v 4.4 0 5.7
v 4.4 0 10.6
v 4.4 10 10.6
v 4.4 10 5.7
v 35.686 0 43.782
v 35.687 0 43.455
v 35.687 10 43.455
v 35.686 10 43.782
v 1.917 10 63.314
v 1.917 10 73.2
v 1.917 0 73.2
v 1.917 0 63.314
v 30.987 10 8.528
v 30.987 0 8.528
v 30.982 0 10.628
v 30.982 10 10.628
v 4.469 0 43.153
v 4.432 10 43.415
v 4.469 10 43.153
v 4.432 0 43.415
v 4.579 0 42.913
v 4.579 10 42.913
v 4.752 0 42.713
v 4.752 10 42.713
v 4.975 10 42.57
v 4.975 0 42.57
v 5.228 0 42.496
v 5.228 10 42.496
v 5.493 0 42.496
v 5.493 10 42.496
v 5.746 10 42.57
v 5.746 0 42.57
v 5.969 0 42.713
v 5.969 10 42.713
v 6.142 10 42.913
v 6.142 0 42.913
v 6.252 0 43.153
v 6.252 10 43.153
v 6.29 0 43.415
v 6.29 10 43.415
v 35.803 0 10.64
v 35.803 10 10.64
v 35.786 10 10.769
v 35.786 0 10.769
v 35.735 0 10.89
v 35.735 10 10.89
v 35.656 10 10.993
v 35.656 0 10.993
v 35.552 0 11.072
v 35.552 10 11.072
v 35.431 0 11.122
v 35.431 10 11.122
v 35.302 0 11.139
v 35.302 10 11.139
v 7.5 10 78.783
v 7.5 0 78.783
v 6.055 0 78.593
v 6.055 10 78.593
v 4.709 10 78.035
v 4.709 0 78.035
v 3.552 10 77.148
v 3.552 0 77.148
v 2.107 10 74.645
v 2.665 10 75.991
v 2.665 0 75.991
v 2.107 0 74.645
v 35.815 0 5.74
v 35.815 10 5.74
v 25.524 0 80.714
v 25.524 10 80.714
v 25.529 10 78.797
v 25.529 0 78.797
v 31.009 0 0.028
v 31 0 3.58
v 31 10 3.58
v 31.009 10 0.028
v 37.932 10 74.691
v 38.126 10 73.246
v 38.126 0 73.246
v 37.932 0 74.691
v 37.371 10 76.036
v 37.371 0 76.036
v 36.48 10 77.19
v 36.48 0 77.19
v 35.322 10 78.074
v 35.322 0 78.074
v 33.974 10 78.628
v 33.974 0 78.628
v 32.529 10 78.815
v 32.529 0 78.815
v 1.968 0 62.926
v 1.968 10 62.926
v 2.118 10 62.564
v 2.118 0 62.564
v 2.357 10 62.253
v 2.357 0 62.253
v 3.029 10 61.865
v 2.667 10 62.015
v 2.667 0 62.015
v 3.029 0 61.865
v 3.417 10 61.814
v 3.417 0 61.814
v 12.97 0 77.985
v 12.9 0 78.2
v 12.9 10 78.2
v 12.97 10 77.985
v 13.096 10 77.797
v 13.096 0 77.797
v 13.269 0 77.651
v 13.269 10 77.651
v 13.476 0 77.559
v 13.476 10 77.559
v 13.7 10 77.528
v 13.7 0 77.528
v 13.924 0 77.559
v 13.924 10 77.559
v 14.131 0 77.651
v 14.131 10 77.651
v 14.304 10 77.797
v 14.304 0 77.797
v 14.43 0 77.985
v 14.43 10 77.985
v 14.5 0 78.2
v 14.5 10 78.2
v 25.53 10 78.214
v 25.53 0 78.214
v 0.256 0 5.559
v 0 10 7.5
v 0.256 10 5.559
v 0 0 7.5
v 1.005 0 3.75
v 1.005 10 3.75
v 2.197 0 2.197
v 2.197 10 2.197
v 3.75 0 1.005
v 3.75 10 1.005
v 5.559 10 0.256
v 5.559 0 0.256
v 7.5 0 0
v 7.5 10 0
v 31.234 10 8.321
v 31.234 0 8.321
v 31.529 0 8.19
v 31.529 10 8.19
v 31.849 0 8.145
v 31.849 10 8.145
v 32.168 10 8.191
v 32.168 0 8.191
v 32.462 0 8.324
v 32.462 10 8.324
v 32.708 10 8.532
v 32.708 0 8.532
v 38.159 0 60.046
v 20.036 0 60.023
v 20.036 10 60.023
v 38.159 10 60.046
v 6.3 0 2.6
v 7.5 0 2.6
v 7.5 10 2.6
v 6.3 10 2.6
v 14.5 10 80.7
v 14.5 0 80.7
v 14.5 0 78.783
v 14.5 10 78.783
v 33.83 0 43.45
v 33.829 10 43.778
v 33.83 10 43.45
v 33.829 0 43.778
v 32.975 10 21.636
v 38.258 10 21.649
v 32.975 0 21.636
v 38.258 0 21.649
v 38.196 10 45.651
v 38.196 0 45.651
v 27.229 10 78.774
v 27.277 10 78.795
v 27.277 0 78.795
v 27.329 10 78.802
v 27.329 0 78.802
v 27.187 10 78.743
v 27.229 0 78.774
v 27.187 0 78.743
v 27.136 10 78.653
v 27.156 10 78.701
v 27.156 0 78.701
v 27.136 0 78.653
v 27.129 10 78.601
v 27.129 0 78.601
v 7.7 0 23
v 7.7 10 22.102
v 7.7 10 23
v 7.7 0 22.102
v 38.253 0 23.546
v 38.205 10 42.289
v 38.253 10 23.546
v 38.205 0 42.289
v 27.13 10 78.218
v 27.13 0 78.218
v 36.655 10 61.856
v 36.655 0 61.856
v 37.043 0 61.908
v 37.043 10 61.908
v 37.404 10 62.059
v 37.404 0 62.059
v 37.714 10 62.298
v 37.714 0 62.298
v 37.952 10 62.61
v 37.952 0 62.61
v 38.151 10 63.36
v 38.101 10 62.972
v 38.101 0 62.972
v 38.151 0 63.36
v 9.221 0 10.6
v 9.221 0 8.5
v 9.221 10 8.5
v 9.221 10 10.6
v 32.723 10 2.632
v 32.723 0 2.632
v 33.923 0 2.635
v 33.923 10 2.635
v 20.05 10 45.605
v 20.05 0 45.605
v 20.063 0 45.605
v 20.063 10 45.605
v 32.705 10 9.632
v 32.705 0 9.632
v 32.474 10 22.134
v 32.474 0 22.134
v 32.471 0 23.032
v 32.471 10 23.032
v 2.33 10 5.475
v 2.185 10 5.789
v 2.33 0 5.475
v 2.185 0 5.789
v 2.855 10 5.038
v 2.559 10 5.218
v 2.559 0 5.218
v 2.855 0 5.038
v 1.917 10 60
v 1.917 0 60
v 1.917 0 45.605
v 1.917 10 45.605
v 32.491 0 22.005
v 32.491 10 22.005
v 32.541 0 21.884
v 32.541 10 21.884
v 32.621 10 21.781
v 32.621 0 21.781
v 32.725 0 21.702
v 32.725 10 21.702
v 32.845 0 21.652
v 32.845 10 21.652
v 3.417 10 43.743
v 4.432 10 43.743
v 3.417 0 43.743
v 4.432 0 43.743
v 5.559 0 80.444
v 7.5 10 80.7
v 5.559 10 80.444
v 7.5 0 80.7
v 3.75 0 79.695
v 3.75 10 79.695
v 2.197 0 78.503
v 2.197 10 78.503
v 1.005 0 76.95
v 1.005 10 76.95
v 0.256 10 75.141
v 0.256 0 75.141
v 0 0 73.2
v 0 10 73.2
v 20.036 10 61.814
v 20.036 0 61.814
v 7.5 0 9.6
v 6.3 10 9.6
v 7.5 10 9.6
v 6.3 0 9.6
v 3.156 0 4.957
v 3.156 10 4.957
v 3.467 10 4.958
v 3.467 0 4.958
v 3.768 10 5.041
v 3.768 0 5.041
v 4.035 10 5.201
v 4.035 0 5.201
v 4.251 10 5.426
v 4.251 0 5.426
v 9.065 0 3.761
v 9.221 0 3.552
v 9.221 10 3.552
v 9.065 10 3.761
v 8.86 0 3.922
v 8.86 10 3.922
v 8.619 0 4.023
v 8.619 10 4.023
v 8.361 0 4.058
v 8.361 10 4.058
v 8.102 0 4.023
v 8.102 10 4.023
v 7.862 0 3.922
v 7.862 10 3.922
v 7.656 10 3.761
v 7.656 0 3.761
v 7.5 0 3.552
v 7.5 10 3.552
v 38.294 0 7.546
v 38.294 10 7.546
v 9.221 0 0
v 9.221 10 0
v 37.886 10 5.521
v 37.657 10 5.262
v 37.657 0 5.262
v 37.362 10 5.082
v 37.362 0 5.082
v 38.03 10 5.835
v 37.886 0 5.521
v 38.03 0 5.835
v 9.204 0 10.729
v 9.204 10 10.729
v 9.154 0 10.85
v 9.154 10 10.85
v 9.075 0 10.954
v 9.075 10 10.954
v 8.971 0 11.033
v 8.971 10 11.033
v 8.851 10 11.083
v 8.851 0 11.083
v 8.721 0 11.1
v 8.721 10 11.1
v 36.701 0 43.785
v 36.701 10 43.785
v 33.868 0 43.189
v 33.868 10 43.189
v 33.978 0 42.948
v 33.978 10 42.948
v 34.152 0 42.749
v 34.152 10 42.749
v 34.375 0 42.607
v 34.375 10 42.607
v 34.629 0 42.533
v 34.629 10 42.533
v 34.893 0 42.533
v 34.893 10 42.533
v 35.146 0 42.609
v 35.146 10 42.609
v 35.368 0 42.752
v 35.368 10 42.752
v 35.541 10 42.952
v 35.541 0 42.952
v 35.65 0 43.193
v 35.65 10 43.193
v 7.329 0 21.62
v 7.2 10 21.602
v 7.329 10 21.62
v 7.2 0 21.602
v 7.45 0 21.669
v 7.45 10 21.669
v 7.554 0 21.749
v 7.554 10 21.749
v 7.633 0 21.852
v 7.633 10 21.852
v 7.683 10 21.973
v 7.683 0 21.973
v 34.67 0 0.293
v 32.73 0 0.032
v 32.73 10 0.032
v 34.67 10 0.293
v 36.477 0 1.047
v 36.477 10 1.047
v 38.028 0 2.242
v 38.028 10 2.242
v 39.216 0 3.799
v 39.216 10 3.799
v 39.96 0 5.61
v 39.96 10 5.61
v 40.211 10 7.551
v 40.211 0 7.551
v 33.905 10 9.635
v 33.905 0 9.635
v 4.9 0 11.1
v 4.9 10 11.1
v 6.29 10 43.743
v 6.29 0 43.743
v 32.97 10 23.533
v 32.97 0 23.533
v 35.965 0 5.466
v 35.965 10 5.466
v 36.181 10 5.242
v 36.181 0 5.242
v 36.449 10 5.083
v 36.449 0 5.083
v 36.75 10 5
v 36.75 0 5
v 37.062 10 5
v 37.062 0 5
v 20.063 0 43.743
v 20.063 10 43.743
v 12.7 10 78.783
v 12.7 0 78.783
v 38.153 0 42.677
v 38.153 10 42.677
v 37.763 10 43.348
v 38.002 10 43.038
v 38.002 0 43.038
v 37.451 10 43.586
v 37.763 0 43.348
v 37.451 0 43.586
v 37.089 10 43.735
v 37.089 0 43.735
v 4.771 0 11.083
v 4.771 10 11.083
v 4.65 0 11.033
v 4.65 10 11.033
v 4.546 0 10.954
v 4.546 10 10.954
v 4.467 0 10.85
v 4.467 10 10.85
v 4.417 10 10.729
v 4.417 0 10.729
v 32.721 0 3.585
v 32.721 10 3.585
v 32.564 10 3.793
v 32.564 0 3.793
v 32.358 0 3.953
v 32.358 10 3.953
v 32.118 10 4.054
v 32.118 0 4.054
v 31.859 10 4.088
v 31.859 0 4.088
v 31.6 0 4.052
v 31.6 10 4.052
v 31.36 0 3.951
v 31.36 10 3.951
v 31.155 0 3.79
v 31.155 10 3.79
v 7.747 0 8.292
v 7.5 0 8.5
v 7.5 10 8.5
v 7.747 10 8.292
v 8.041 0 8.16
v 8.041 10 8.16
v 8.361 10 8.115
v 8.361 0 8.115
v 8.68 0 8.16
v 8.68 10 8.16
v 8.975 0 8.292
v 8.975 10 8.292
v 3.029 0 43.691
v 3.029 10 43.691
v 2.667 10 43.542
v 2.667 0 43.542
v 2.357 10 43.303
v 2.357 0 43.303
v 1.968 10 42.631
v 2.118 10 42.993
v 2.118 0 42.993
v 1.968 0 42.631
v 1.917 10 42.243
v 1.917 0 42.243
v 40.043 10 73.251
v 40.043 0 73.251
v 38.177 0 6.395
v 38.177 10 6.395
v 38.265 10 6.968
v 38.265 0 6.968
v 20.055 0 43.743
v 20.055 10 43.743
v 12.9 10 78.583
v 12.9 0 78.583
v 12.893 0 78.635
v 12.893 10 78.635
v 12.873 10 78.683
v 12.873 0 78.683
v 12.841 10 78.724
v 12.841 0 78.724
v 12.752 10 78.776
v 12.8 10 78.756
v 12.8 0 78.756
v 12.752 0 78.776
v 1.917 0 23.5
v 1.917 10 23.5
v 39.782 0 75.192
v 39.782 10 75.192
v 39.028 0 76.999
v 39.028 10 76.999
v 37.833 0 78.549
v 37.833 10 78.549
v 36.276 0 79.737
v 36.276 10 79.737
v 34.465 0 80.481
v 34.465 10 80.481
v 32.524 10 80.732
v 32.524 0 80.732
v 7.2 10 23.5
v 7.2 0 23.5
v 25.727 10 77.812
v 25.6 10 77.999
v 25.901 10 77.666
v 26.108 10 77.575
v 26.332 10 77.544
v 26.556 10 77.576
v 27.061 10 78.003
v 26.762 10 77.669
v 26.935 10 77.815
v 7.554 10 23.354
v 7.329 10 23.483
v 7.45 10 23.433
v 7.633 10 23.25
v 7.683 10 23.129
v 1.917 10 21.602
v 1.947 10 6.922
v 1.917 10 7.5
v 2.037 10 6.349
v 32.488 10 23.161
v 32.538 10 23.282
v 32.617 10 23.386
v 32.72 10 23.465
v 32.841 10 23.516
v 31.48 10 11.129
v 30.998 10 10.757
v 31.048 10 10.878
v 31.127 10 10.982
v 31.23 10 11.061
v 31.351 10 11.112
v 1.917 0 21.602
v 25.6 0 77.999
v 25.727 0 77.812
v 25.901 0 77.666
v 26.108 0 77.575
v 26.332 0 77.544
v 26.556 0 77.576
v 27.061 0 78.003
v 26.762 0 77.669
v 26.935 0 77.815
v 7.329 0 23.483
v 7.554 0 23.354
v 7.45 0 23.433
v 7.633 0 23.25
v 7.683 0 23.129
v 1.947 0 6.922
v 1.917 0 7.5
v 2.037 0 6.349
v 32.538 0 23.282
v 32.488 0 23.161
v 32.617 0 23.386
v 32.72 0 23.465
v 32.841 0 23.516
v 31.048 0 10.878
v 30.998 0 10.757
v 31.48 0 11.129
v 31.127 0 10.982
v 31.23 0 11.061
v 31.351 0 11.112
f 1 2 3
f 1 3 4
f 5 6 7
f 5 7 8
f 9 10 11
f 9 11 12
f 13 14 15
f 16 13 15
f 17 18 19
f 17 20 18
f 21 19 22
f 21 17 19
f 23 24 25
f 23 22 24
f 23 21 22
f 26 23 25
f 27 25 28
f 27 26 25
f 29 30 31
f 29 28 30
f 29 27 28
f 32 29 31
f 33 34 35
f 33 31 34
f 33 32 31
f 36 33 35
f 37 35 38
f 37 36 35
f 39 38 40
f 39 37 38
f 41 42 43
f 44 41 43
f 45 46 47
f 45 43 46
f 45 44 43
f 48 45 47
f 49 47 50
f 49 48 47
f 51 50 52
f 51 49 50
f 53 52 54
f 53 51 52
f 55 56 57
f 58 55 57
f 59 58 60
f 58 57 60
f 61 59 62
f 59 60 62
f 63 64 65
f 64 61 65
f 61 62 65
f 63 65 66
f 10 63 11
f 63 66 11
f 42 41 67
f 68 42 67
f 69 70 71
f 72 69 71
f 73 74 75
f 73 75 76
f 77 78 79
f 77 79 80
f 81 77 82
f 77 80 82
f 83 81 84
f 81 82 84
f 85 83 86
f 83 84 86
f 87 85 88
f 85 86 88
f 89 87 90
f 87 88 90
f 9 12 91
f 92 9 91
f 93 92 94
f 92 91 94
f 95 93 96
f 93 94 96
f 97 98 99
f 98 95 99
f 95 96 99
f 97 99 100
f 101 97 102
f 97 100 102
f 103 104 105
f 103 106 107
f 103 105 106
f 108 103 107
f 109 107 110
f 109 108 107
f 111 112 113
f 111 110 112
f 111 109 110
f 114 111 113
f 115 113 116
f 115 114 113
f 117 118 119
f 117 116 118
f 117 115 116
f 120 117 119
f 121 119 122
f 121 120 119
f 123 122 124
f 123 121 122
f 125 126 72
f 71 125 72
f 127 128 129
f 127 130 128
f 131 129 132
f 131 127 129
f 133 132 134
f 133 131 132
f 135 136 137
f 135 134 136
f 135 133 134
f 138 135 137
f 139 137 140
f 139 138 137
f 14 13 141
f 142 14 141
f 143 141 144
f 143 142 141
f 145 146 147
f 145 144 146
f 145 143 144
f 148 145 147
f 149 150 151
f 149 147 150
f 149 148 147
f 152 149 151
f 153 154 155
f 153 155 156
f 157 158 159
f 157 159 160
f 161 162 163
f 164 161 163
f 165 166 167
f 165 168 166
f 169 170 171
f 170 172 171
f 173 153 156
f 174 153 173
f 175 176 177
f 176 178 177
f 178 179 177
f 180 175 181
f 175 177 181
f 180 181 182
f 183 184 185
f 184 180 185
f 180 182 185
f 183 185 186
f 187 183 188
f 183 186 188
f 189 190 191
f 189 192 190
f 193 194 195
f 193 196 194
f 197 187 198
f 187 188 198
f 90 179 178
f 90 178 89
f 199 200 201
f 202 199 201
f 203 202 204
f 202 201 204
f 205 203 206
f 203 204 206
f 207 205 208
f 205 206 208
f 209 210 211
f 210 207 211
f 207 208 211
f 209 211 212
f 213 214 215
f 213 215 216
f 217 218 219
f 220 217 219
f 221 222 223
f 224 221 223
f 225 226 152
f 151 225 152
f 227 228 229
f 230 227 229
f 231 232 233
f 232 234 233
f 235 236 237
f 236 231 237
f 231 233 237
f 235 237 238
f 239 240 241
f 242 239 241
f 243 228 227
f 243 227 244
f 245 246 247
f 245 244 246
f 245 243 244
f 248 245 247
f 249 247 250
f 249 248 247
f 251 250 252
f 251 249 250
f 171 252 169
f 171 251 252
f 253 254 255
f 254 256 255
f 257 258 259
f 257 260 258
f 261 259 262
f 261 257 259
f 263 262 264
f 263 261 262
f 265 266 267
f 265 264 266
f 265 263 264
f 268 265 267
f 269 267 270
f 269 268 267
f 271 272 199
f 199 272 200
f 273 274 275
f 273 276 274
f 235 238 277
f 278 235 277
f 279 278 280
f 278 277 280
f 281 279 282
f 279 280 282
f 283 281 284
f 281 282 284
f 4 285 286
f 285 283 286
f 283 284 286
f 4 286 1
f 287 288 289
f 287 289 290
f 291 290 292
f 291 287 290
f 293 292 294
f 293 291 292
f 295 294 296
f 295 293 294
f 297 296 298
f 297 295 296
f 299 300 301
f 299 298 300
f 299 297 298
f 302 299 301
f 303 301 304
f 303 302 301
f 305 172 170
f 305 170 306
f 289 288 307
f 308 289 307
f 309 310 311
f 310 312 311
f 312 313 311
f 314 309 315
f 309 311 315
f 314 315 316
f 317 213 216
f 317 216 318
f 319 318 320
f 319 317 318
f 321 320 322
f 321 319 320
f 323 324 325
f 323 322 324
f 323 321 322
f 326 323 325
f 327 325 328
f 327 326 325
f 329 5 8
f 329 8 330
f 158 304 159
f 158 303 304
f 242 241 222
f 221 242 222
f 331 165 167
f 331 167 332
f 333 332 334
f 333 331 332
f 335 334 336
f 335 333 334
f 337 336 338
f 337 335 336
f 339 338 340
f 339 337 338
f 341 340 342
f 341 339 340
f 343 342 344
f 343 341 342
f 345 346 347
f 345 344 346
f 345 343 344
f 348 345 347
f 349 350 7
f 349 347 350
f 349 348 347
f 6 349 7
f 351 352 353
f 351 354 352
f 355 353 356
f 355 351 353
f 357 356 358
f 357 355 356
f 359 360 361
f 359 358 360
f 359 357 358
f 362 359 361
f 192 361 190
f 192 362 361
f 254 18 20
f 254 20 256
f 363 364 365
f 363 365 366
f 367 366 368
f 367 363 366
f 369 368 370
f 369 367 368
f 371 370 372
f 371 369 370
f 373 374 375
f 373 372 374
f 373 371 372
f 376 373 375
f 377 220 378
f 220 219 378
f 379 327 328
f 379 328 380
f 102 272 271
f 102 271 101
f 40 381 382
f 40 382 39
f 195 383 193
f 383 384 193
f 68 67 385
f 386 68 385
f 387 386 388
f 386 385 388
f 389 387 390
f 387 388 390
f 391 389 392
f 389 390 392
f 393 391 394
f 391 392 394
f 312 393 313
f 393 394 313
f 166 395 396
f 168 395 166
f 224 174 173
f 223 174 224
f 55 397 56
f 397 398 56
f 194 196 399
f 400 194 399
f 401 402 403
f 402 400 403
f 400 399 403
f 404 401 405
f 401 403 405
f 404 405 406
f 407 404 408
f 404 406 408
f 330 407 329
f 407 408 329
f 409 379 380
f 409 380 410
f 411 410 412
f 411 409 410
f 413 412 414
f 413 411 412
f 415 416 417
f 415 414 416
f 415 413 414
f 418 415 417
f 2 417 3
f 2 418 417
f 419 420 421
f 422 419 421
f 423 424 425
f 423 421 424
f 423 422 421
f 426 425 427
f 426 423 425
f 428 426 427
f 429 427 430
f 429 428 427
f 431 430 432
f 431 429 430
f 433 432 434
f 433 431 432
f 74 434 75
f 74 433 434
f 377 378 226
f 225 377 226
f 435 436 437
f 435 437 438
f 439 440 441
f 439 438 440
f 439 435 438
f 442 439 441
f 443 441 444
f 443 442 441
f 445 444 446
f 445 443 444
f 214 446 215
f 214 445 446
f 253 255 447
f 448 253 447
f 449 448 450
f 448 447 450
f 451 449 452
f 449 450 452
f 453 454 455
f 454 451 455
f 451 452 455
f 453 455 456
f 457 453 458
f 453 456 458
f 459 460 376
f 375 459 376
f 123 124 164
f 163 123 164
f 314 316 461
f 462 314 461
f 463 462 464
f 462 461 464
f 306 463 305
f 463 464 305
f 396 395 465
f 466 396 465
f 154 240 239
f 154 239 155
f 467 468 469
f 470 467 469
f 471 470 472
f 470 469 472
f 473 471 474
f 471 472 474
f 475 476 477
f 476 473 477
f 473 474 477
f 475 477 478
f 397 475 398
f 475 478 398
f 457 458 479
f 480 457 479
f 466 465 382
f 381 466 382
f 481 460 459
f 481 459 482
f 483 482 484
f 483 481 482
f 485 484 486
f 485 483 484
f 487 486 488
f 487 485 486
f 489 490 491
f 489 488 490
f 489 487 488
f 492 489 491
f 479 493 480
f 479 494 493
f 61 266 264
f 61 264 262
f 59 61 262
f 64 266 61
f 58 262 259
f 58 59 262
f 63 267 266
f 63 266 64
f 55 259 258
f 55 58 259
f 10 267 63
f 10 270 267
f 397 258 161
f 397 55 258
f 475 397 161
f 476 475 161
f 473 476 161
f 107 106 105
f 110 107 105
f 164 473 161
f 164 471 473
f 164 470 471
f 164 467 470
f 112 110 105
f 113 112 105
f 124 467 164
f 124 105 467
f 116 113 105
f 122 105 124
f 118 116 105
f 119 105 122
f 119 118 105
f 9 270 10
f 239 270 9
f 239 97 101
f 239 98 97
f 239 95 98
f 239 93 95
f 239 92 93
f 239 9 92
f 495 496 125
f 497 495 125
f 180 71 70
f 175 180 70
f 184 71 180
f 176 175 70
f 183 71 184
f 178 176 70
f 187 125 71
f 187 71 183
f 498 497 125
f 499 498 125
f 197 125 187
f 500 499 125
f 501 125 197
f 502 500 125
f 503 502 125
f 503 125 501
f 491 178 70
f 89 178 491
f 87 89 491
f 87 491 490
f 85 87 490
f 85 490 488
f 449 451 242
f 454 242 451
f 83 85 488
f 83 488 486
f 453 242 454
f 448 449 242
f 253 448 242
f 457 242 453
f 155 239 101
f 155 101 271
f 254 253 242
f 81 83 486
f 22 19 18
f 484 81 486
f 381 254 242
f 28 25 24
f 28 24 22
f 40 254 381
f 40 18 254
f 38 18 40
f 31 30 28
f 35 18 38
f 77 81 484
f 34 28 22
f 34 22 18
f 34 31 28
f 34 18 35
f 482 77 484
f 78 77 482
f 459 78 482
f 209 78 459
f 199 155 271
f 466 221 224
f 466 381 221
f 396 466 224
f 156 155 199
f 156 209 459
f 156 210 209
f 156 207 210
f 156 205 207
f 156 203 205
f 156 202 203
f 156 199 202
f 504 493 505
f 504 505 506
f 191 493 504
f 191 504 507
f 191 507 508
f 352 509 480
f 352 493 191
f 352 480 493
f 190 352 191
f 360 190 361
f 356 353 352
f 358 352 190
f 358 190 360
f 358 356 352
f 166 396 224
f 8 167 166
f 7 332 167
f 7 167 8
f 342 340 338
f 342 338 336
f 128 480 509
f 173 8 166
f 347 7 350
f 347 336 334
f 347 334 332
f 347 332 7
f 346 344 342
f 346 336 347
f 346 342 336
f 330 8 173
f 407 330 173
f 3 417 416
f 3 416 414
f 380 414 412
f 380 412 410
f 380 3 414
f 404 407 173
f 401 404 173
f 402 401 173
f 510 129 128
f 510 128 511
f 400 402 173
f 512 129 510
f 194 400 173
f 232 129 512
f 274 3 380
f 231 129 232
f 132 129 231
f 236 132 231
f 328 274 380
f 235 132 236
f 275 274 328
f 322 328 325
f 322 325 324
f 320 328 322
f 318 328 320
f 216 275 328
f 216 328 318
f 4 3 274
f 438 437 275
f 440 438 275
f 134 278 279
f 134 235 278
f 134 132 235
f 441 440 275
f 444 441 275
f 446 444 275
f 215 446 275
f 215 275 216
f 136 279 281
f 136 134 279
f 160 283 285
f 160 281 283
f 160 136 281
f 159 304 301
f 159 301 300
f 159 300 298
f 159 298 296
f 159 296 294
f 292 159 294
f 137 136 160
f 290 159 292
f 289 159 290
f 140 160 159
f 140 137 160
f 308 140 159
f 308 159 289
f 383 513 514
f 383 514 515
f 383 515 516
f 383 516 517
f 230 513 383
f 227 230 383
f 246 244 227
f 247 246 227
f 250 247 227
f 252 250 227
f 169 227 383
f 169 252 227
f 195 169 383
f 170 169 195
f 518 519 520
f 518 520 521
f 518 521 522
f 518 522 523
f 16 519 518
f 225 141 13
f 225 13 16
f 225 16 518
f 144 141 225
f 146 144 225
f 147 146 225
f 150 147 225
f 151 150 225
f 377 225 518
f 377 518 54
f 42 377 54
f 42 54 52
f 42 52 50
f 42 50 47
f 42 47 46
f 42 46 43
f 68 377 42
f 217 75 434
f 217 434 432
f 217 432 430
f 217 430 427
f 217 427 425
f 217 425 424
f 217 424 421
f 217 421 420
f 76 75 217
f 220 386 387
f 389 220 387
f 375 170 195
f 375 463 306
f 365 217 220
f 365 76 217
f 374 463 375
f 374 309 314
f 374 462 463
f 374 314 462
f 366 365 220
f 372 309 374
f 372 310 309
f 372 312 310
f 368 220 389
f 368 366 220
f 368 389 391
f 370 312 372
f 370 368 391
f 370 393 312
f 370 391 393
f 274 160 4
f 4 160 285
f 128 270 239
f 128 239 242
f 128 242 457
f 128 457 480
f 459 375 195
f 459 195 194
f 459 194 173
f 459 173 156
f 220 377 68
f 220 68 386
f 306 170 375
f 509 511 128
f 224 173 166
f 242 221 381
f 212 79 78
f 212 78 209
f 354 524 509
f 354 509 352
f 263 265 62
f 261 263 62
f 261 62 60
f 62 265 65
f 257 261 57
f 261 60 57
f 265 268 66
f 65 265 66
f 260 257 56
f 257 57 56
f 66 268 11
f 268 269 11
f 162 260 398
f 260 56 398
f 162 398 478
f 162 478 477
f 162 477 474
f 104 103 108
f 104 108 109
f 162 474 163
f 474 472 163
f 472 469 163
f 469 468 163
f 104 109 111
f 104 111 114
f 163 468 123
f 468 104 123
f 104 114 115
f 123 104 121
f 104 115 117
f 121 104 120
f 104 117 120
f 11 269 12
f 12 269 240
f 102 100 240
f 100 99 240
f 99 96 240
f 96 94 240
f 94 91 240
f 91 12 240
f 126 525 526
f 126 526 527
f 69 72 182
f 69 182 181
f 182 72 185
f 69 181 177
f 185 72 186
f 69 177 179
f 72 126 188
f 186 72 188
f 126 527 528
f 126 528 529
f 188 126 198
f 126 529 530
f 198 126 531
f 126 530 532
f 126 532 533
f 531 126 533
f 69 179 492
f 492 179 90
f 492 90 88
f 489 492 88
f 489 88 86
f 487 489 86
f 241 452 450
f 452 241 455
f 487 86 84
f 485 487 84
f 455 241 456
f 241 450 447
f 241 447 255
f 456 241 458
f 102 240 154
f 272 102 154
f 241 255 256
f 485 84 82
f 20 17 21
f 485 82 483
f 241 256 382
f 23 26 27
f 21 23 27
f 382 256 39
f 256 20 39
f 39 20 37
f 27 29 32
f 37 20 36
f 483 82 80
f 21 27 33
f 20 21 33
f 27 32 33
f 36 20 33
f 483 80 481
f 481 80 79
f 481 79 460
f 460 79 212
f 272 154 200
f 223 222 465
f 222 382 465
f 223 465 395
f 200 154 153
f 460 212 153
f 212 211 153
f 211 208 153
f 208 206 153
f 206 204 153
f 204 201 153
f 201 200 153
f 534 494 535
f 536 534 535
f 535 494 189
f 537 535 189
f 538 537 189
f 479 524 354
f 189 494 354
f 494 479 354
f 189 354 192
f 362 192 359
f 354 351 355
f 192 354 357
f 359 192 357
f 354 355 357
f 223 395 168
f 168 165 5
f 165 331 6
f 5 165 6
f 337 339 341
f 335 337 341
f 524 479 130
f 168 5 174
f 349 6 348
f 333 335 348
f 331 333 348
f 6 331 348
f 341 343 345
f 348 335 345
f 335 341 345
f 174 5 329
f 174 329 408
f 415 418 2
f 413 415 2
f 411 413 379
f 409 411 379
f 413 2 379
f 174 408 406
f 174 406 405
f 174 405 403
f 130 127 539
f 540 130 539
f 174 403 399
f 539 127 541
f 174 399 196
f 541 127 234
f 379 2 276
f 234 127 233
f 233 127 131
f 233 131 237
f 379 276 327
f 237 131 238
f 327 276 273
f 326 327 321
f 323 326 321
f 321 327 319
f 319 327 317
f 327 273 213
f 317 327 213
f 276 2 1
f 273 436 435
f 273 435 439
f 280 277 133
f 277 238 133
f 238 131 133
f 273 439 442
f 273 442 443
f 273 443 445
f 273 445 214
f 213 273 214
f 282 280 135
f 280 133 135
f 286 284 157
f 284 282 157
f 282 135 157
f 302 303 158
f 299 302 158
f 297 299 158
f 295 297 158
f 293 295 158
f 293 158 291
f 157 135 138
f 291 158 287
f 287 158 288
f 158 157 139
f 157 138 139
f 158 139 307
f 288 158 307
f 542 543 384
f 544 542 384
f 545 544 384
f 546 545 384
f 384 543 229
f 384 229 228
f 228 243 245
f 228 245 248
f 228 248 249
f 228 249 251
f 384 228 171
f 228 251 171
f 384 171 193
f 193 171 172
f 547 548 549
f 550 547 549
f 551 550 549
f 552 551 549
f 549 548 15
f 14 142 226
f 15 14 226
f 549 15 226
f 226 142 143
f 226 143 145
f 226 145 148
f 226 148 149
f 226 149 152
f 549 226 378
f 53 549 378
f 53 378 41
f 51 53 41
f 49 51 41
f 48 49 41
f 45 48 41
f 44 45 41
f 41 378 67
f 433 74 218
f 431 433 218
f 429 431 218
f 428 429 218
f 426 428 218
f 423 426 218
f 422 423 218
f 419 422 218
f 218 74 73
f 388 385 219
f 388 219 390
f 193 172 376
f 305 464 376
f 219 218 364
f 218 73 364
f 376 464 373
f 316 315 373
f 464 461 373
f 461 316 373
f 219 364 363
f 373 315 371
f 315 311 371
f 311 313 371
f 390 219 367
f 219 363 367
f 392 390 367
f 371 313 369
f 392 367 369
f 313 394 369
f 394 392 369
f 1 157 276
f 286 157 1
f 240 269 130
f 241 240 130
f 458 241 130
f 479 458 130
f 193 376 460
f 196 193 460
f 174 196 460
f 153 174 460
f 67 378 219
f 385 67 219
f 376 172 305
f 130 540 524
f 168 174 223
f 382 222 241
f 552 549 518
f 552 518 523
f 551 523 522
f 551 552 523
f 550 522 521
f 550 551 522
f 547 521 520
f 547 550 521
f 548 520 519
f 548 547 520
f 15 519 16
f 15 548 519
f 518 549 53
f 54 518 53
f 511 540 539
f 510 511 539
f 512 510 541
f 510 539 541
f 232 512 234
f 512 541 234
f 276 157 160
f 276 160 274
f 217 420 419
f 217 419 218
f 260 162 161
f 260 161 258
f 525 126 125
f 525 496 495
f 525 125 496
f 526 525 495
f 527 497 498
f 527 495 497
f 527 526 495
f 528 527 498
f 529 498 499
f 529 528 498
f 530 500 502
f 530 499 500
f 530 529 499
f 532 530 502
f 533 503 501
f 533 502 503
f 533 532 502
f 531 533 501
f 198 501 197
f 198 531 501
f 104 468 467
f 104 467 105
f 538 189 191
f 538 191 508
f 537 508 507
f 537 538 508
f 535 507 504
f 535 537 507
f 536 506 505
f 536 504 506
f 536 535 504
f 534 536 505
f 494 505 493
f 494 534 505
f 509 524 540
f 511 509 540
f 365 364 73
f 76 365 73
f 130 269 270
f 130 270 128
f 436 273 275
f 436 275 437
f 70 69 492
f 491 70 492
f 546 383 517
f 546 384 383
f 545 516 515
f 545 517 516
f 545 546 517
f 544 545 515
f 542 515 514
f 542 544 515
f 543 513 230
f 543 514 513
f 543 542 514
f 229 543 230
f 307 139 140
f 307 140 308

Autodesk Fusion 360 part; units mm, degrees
sketch "Boceto2" plane through (0, 0, 0) normal (0, 1, 0) x (1, 0, 0)
  line L0 (7.5, 0) -> (9.2213, 0)
  line L1 (14.5, -80.7) -> (7.5, -80.7)
  line L2 (0, -73.2) -> (0, -7.5)
  arc A0 (0, -73.2) -> (7.5, -80.7) centre (7.5, -73.2) ccw
  arc A1 (7.5, 0) -> (0, -7.5) centre (7.5, -7.5) ccw
  line L3 (12.7, -78.7828) -> (7.5, -78.7828)
  arc A2 (1.9172, -73.2) -> (7.5, -78.7828) centre (7.5, -73.2) ccw
  line L4 (7.5, -3.5523) -> (7.5, -2.6)
  line L5 (7.5, -2.6) -> (6.3, -2.6)
  line L6 (6.3, -2.6) -> (6.3, -9.6)
  line L7 (6.3, -9.6) -> (7.5, -9.6)
  line L8 (7.5, -9.6) -> (7.5, -8.5)
  line L9 (9.2213, -8.5) -> (9.2213, -10.6)
  line L10 (8.7213, -11.1) -> (4.9, -11.1)
  line L11 (4.4, -10.6) -> (4.4, -5.7)
  arc A3 (4.4, -5.7) -> (2.8546, -5.0381) centre (3.3076, -6.1153) ccw
  arc A4 (4.4, -5.7) -> (2.1854, -5.7893) centre (3.3076, -6.1153) ccw
  arc A5 (2.1854, -5.7893) -> (1.9172, -7.5) centre (7.5062, -7.5) ccw
  arc A6 (9.2213, -8.5) -> (7.5, -8.5) centre (8.3607, -9.2707) ccw
  arc A7 (7.5, -3.5523) -> (9.2213, -3.5523) centre (8.3607, -3.072) ccw
  line L12 (9.2213, -3.5523) -> (9.2213, 0)
  line L13 (20.1126, -1.9172) -> (20.115, -1.9172)
  line L14 (1.9172, -21.6025) -> (7.2, -21.6025)
  line L15 (7.7, -22.1025) -> (7.7, -23)
  line L16 (7.2, -23.5) -> (1.9172, -23.5)
  line L17 (1.9172, -45.6046) -> (20.0634, -45.6046)
  line L18 (20.0634, -43.7426) -> (20.0634, -43.7426)
  line L19 (20.036, -60.0002) -> (20.036, -60.0234)
  line L20 (20.036, -61.8138) -> (3.4172, -61.8138)
  line L21 (14.5, -80.7) -> (14.5, -78.7828)
  line L22 (1.9172, -21.6025) -> (1.9172, -7.5)
  arc A8 (7.2, -23.5) -> (7.7, -23) centre (7.2, -23) ccw
  arc A9 (7.7, -22.1025) -> (7.2, -21.6025) centre (7.2, -22.1025) ccw
  line L23 (1.9172, -42.2426) -> (1.9172, -23.5)
  arc A10 (1.9172, -42.2426) -> (3.4172, -43.7426) centre (3.4172, -42.2426) ccw
  line L24 (6.2895, -43.7426) -> (6.2895, -43.415)
  line L25 (4.4317, -43.415) -> (4.4317, -43.7426)
  arc A11 (6.2895, -43.415) -> (4.4317, -43.415) centre (5.3606, -43.415) ccw
  line L26 (20.0634, -43.7426) -> (6.2895, -43.7426)
  line L27 (4.4317, -43.7426) -> (3.4172, -43.7426)
  line L28 (1.9172, -73.2) -> (1.9172, -63.3138)
  line L29 (1.9172, -60.0002) -> (1.9172, -45.6046)
  arc A12 (3.4172, -61.8138) -> (1.9172, -63.3138) centre (3.4172, -63.3138) ccw
  line L30 (12.9, -78.5828) -> (12.9, -78.2)
  line L31 (14.5, -78.2) -> (14.5, -78.7828)
  arc A13 (14.5, -78.2) -> (12.9, -78.2) centre (13.7, -78.34) ccw
  arc A14 (4.4, -10.6) -> (4.9, -11.1) centre (4.9, -10.6) ccw
  arc A15 (8.7213, -11.1) -> (9.2213, -10.6) centre (8.7213, -10.6) ccw
  arc A16 (12.7, -78.7828) -> (12.9, -78.5828) centre (12.7, -78.5828) ccw
  line L32 (32.4735, -22.1342) -> (32.4712, -23.0317)
  line L33 (35.8029, -10.6401) -> (35.8154, -5.7401)
  arc A17 (36.701, -43.7851) -> (38.2048, -42.289) centre (36.7048, -42.2851) ccw
  line L34 (38.1594, -60.0465) -> (38.1962, -45.651)
  line L35 (33.8286, -43.7778) -> (33.8295, -43.4502)
  arc A18 (35.6873, -43.4549) -> (33.8295, -43.4502) centre (34.7584, -43.4526) ccw
  line L36 (32.7209, -3.5846) -> (32.7233, -2.6322)
  line L37 (35.6864, -43.7825) -> (36.701, -43.7851)
  line L38 (32.9699, -23.5329) -> (38.2527, -23.5464)
  line L39 (40.0429, -73.2512) -> (40.2108, -7.5514)
  line L40 (38.2048, -42.289) -> (38.2527, -23.5464)
  arc A19 (32.4712, -23.0317) -> (32.9699, -23.5329) centre (32.9712, -23.0329) ccw
  line L41 (35.6873, -43.4549) -> (35.6864, -43.7825)
  arc A20 (37.3625, -5.0822) -> (35.8154, -5.7401) centre (36.9067, -6.1583) ccw
  line L42 (30.9869, -8.5278) -> (30.9816, -10.6278)
  line L43 (27.1292, -78.601) -> (27.1301, -78.2182)
  arc A21 (38.2936, -7.5465) -> (38.0298, -5.8351) centre (32.7046, -7.5322) ccw
  line L44 (25.5301, -78.2141) -> (25.5286, -78.7969)
  line L45 (32.73, -0.0322) -> (31.0086, -0.0278)
  arc A22 (40.2108, -7.5514) -> (32.73, -0.0322) centre (32.7108, -7.5322) ccw
  arc A23 (35.3016, -11.1388) -> (35.8029, -10.6401) centre (35.3029, -10.6388) ccw
  arc A24 (32.5237, -80.732) -> (40.0429, -73.2512) centre (32.5429, -73.232) ccw
  arc A25 (32.9748, -21.6355) -> (32.4735, -22.1342) centre (32.9735, -22.1355) ccw
  line L46 (32.7054, -9.6322) -> (32.7082, -8.5322)
  arc A26 (30.9816, -10.6278) -> (31.4803, -11.1291) centre (31.4816, -10.6291) ccw
  line L47 (33.9233, -2.6353) -> (33.9054, -9.6353)
  line L48 (27.3286, -78.8015) -> (32.5286, -78.8148)
  arc A27 (38.0298, -5.8351) -> (35.8154, -5.7401) centre (36.9067, -6.1583) ccw
  arc A28 (38.151, -63.3601) -> (36.6548, -61.8563) centre (36.651, -63.3563) ccw
  arc A29 (30.9996, -3.5802) -> (32.7209, -3.5846) centre (31.8615, -3.102) ccw
  line L49 (30.9996, -3.5802) -> (31.0086, -0.0278)
  arc A30 (32.5286, -78.8148) -> (38.1257, -73.2463) centre (32.5429, -73.232) ccw
  line L50 (38.1257, -73.2463) -> (38.151, -63.3601)
  line L51 (38.2576, -21.649) -> (38.2936, -7.5465)
  line L52 (31.4803, -11.1291) -> (35.3016, -11.1388)
  line L53 (25.5237, -80.7141) -> (25.5286, -78.7969)
  arc A31 (27.1292, -78.601) -> (27.3286, -78.8015) centre (27.3292, -78.6015) ccw
  line L54 (32.7233, -2.6322) -> (33.9233, -2.6353)
  line L55 (33.9054, -9.6353) -> (32.7054, -9.6322)
  arc A32 (32.7082, -8.5322) -> (30.9869, -8.5278) centre (31.8456, -9.3007) ccw
  line L56 (38.2576, -21.649) -> (32.9748, -21.6355)
  line L57 (25.5237, -80.7141) -> (32.5237, -80.732)
  arc A33 (27.1301, -78.2182) -> (25.5301, -78.2141) centre (26.3298, -78.3561) ccw
  line L58 (20.0548, -43.7426) -> (33.8286, -43.7778)
  line L59 (38.1962, -45.651) -> (20.05, -45.6046)
  line L60 (20.036, -61.8138) -> (36.6548, -61.8563)
  line L61 (1.9172, -60.0002) -> (38.1594, -60.0465)
  line L62 (20.036, -61.8138) -> (20.0119, -80.7) construction
  line L63 (20.115, 0) -> (20.0591, -43.7426) construction
  line L64 (20.0567, -45.6046) -> (20.0383, -60.0234) construction
  point P0 (0, -80.7)
  point P1 (40.0237, -80.7511)
  point P2 (40.2299, -0.0514)
  point P3 (40.2299, -0.0514)
  dimension "d10" = 80.7
  dimension "d12" = 7.5
  dimension "d14" = 0.5
  dimension "d15" = 1.5
  dimension "d16" = 1.5
  dimension "d17" = 0.5
  dimension "d18" = 0.2
extrude "Extruir1" add sketch "Boceto2" along normal blind 10
equation "d19 = L"
equation "L = 10 mm"
